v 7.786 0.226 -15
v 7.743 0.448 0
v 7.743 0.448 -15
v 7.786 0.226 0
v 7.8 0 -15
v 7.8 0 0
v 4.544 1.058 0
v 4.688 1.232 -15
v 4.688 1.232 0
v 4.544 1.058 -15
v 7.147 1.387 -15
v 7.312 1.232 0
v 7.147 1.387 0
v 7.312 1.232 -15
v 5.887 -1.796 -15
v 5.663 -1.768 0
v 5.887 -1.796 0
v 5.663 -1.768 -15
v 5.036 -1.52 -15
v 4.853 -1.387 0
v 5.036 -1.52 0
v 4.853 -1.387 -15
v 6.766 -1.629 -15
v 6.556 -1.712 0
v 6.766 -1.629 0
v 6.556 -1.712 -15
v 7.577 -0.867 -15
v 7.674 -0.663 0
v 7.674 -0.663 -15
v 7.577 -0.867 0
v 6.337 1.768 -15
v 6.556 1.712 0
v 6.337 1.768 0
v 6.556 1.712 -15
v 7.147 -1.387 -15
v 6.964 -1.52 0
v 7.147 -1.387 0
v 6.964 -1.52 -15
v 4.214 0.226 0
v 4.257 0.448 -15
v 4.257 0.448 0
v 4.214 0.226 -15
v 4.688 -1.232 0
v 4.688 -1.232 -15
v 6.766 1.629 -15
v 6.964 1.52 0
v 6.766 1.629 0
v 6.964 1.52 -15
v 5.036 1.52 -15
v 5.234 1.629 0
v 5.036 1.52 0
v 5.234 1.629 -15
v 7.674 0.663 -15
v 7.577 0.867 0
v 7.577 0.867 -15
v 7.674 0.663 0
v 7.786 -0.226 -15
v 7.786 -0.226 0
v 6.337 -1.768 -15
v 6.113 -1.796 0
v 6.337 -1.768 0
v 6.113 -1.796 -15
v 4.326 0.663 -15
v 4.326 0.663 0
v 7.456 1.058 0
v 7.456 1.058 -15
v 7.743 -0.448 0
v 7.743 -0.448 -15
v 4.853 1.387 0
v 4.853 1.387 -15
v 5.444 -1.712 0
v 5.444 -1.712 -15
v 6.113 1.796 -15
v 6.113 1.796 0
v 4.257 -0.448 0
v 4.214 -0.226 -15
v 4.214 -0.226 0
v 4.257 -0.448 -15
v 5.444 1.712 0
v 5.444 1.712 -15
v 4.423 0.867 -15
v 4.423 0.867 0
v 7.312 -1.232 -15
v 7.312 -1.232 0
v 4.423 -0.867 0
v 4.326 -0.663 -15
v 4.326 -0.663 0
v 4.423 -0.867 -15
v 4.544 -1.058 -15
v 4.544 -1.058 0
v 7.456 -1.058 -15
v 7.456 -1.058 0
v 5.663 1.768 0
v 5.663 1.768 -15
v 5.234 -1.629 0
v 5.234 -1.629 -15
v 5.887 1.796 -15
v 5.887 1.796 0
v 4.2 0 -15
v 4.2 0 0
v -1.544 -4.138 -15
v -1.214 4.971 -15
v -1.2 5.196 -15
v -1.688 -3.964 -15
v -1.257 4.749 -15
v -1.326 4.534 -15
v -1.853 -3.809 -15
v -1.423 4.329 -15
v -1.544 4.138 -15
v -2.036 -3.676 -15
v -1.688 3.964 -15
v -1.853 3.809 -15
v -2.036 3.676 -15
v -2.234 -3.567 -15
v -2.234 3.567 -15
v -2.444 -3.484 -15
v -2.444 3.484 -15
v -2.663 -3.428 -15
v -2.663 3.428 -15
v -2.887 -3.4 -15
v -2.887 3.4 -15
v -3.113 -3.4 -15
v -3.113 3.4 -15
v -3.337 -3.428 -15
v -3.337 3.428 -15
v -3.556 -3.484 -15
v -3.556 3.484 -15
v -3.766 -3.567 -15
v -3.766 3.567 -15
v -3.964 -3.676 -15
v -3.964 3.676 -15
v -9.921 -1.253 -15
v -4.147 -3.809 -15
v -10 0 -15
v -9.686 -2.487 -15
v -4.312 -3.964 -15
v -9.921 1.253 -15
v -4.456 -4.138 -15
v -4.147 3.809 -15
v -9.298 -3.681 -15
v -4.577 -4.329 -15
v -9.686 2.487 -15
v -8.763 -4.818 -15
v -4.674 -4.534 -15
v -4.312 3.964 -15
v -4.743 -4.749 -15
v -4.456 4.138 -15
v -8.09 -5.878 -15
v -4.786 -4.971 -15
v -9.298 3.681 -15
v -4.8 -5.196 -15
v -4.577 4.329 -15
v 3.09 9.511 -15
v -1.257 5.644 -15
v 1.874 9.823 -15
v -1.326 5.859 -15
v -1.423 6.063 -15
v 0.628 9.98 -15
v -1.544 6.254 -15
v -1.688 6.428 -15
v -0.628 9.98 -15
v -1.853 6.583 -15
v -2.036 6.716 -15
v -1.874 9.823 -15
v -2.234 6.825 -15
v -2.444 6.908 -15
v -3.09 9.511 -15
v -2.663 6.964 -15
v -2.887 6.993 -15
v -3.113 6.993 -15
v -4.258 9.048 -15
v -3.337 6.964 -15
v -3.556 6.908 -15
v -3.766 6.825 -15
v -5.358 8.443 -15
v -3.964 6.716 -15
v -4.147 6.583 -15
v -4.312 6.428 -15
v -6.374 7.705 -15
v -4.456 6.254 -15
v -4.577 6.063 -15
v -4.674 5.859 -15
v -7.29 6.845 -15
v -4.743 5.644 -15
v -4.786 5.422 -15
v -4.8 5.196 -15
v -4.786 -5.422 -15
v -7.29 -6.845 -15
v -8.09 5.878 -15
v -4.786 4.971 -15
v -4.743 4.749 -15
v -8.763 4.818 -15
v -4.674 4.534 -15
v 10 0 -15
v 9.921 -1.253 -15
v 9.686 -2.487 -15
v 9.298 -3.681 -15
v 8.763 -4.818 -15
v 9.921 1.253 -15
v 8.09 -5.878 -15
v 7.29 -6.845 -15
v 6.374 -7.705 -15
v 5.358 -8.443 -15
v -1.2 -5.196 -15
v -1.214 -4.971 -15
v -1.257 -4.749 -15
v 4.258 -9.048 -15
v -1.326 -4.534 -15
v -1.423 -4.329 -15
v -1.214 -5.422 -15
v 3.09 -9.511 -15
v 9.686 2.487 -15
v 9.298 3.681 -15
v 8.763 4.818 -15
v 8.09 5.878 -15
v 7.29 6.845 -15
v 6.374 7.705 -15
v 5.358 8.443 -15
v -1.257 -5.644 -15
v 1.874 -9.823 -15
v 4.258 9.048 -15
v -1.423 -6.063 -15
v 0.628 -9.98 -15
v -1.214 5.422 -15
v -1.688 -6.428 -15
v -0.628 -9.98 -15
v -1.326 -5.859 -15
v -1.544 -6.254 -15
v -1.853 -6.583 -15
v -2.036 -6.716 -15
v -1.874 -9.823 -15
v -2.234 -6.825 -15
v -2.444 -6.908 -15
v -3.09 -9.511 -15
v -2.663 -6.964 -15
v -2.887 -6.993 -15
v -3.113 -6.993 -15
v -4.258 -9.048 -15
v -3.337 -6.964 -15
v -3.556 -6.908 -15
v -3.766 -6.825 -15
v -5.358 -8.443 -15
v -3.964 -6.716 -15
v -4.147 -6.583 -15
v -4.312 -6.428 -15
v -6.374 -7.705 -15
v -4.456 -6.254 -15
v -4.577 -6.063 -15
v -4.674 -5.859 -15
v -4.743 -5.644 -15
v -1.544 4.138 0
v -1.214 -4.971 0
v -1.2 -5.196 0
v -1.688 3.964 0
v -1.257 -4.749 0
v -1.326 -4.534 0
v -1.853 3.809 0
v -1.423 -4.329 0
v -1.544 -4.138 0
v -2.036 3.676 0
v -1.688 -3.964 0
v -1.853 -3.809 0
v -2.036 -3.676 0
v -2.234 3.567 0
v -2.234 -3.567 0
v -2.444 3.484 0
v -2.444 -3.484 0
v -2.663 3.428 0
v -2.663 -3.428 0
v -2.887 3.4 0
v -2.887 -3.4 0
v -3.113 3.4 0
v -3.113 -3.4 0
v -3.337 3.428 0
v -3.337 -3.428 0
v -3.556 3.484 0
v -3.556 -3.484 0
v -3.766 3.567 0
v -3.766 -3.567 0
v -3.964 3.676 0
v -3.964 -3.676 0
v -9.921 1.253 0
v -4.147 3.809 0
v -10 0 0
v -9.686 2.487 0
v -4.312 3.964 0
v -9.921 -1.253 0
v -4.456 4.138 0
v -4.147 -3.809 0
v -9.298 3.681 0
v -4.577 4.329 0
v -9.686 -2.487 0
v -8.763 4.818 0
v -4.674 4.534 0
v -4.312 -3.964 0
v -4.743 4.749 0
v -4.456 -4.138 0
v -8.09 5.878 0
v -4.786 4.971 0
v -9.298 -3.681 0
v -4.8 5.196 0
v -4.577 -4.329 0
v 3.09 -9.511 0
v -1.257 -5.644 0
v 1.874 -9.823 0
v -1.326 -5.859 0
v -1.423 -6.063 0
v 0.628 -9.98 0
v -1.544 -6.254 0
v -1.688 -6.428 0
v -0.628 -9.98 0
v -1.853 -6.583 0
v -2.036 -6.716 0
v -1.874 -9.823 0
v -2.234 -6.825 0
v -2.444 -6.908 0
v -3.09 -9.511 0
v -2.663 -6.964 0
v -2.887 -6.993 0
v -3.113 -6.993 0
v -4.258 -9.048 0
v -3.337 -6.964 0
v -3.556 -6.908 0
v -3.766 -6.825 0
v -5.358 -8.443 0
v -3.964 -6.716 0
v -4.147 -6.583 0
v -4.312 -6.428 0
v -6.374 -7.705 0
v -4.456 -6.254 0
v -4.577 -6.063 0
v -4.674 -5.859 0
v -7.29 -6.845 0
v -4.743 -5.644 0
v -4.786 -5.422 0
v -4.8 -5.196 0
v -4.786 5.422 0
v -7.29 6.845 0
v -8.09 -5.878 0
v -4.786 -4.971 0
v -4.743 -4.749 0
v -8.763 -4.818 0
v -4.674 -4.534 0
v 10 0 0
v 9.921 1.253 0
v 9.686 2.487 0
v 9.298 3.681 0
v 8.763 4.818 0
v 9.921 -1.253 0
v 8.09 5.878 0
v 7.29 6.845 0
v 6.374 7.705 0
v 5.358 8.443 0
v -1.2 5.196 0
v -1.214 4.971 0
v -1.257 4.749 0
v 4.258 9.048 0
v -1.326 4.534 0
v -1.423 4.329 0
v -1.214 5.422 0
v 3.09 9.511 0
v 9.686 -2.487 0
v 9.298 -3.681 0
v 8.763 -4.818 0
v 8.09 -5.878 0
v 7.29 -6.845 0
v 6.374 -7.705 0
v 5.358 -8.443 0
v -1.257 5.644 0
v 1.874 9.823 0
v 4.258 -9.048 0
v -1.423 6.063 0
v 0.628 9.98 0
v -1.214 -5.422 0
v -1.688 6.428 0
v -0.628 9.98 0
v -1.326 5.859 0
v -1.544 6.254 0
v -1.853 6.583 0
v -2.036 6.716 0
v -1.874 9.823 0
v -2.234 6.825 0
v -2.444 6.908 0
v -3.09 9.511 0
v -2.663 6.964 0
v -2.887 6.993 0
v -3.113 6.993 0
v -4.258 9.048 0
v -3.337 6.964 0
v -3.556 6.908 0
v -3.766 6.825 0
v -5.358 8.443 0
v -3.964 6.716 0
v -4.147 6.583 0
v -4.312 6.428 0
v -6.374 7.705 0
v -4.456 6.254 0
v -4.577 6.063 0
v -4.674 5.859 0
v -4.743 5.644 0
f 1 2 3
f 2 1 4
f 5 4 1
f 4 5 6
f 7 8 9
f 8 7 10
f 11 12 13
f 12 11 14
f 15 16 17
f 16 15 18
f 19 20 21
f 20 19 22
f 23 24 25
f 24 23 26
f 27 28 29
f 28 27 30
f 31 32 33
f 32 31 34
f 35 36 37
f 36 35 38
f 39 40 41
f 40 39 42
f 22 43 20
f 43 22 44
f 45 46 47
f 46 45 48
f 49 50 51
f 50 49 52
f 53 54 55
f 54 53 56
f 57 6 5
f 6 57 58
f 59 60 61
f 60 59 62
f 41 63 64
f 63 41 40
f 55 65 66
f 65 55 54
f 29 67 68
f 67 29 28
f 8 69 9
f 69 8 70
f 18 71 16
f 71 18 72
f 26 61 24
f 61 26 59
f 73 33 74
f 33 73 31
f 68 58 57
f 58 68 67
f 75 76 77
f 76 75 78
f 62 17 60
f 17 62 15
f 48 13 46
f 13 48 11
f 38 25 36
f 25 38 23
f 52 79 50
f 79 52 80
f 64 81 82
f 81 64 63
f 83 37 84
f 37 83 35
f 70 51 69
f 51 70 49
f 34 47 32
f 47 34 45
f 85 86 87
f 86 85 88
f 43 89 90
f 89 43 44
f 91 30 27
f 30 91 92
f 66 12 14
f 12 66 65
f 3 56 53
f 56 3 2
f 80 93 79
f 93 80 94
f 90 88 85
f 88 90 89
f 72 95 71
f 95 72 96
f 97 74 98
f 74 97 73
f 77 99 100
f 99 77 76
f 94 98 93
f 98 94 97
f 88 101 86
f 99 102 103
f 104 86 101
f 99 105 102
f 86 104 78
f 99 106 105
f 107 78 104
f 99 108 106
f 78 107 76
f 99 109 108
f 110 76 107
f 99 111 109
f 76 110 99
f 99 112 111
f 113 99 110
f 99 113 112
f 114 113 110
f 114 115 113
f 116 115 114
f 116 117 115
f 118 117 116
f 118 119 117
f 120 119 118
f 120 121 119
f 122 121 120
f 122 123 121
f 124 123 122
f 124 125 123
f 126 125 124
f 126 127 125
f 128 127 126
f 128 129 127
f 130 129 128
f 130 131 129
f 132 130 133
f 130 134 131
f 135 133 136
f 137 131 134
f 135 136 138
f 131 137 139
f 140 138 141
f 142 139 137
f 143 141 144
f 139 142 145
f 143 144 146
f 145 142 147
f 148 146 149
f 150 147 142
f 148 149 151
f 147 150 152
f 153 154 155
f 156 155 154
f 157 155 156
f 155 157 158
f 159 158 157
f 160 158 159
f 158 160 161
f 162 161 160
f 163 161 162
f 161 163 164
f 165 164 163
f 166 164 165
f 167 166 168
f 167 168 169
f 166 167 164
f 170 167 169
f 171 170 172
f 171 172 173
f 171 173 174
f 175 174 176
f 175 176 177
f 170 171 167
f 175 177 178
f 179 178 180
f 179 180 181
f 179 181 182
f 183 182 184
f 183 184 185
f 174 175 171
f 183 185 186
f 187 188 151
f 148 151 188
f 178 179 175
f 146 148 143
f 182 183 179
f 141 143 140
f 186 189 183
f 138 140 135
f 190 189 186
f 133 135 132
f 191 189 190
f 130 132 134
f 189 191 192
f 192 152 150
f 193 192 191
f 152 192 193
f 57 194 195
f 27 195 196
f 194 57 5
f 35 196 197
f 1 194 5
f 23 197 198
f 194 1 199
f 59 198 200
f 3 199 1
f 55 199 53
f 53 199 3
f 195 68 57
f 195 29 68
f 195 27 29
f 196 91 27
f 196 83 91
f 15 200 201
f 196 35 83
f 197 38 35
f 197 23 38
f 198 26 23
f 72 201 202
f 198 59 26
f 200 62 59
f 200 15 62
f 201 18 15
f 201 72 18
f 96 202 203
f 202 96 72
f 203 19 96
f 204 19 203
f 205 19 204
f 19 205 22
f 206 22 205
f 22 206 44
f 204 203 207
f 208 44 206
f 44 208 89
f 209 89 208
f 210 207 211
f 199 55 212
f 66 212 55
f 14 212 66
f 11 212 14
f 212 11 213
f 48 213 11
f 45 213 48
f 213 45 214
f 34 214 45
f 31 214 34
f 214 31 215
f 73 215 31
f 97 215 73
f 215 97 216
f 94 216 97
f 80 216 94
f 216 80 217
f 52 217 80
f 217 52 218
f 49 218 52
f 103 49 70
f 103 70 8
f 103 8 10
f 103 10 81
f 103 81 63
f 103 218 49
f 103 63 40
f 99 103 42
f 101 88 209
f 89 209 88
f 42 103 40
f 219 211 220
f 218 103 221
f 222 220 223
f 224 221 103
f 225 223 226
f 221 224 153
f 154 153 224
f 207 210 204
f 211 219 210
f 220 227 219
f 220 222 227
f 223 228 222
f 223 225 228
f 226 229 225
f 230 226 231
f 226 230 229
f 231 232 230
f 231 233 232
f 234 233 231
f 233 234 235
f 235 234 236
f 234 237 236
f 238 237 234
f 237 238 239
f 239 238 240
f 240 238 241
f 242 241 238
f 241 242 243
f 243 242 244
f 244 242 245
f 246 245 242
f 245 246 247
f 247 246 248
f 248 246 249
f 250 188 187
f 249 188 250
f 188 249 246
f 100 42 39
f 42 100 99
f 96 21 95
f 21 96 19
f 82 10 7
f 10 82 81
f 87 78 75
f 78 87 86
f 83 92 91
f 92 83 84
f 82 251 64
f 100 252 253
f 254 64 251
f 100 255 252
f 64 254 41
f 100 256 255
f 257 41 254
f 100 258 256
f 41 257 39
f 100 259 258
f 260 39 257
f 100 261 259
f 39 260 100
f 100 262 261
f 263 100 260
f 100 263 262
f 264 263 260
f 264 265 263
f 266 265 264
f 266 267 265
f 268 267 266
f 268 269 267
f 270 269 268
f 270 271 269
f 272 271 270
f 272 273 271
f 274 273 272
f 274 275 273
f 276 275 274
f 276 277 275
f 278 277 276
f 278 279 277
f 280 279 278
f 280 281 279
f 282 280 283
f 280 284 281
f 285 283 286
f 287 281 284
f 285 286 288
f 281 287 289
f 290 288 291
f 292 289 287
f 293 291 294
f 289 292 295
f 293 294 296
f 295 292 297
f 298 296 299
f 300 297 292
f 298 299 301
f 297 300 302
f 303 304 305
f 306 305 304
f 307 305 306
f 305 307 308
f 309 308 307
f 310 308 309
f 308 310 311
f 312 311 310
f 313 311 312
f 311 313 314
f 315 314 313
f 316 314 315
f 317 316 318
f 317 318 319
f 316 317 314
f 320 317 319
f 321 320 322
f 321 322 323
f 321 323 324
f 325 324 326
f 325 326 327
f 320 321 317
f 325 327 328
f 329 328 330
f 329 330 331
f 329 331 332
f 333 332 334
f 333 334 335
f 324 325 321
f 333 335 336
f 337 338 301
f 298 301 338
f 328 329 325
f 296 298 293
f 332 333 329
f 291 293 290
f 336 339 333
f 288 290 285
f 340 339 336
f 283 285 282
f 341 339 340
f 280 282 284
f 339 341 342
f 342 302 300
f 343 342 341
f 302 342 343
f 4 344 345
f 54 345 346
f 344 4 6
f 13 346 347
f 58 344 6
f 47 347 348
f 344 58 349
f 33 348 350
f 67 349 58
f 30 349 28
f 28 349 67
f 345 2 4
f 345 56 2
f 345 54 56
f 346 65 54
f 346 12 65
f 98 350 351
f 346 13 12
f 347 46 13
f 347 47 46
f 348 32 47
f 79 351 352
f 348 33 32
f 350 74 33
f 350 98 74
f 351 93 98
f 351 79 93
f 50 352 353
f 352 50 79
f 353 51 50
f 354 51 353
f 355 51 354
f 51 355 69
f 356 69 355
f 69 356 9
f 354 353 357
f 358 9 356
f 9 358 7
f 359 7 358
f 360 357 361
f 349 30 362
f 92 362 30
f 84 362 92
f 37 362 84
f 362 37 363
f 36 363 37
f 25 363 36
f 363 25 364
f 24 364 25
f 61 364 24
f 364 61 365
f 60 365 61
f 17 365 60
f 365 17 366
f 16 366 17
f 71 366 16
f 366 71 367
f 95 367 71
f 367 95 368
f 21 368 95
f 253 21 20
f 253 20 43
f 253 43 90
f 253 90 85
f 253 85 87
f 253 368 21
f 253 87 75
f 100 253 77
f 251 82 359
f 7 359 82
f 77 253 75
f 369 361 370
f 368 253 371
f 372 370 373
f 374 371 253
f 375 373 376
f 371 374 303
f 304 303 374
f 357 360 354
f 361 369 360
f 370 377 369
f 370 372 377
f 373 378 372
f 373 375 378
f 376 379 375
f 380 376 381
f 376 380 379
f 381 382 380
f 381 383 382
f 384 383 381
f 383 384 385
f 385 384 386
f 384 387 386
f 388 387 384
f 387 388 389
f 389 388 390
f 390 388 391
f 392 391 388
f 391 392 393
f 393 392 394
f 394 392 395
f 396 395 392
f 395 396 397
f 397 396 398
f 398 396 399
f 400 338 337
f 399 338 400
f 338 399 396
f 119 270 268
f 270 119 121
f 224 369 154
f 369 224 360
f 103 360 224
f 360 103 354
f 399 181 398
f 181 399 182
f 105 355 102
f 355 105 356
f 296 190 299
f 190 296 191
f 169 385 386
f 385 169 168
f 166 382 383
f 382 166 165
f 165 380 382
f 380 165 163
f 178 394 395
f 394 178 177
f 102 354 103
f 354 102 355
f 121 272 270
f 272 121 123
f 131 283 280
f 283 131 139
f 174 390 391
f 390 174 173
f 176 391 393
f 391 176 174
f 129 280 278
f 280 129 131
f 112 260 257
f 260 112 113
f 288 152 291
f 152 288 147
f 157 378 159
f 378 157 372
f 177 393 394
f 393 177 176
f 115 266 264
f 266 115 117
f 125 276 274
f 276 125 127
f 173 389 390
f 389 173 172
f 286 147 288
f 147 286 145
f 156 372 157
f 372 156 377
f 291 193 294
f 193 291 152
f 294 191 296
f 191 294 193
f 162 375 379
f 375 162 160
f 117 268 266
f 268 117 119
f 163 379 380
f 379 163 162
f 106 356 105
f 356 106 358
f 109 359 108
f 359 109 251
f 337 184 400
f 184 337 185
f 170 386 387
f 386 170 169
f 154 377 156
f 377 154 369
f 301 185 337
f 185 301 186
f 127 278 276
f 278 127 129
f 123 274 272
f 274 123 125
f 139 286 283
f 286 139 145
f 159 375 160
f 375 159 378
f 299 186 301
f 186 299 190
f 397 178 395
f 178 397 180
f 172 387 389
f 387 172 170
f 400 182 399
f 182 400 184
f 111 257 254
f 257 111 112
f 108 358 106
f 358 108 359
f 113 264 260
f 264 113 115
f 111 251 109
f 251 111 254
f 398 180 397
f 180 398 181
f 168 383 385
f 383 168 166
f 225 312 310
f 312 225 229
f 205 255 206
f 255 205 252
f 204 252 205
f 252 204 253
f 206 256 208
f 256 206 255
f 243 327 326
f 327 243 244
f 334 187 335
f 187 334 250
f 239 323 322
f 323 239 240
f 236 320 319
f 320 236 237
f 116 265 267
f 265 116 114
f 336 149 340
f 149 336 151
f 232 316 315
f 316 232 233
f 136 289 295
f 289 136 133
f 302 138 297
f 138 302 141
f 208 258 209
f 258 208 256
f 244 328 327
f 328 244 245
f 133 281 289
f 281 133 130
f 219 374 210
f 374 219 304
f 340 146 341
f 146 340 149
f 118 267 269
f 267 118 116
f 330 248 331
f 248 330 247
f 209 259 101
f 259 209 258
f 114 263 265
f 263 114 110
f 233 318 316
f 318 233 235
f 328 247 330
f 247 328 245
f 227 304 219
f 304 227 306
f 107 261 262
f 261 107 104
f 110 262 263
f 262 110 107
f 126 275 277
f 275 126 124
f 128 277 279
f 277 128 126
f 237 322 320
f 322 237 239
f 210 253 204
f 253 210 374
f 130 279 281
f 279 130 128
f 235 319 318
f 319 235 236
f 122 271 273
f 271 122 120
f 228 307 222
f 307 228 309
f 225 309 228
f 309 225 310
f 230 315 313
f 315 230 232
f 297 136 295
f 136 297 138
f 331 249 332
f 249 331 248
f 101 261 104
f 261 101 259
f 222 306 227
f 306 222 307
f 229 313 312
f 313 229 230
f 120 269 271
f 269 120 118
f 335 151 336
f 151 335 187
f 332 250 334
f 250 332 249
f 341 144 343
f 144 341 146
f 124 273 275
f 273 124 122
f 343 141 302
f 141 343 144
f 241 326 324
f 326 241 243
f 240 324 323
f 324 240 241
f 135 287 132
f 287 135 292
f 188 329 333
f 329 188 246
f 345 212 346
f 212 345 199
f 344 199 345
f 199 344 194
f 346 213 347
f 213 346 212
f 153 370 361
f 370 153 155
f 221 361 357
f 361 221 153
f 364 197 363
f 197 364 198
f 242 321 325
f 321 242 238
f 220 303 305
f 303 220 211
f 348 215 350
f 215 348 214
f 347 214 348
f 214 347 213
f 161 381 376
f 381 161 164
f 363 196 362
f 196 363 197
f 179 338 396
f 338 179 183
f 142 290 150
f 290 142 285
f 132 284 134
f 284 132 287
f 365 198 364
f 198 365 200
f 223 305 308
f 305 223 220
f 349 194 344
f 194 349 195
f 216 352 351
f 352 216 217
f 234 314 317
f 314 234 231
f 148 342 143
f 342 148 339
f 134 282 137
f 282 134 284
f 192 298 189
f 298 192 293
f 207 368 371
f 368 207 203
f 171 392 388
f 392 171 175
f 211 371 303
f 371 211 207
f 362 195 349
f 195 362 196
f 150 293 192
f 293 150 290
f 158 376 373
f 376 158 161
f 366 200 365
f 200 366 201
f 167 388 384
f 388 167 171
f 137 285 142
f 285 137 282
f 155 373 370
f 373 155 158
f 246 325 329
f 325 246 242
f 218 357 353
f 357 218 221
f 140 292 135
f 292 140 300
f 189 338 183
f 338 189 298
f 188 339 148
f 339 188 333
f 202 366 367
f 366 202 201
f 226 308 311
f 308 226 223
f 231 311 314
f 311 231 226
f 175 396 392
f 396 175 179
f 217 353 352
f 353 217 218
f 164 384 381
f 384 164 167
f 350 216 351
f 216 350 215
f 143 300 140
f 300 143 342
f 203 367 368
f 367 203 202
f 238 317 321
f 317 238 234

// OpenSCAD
$fn = 50;


difference() {
	union() {
		translate(v = [0, 0, -15.0000000000]) {
			cylinder(h = 15, r = 10.0000000000);
		}
	}
	union() {
		#translate(v = [6.0000000000, 0.0000000000, -15]) {
			cylinder(h = 15, r = 1.8000000000);
		}
		#translate(v = [-3.0000000000, 5.1961524227, -15]) {
			cylinder(h = 15, r = 1.8000000000);
		}
		#translate(v = [-3.0000000000, -5.1961524227, -15]) {
			cylinder(h = 15, r = 1.8000000000);
		}
	}
}
